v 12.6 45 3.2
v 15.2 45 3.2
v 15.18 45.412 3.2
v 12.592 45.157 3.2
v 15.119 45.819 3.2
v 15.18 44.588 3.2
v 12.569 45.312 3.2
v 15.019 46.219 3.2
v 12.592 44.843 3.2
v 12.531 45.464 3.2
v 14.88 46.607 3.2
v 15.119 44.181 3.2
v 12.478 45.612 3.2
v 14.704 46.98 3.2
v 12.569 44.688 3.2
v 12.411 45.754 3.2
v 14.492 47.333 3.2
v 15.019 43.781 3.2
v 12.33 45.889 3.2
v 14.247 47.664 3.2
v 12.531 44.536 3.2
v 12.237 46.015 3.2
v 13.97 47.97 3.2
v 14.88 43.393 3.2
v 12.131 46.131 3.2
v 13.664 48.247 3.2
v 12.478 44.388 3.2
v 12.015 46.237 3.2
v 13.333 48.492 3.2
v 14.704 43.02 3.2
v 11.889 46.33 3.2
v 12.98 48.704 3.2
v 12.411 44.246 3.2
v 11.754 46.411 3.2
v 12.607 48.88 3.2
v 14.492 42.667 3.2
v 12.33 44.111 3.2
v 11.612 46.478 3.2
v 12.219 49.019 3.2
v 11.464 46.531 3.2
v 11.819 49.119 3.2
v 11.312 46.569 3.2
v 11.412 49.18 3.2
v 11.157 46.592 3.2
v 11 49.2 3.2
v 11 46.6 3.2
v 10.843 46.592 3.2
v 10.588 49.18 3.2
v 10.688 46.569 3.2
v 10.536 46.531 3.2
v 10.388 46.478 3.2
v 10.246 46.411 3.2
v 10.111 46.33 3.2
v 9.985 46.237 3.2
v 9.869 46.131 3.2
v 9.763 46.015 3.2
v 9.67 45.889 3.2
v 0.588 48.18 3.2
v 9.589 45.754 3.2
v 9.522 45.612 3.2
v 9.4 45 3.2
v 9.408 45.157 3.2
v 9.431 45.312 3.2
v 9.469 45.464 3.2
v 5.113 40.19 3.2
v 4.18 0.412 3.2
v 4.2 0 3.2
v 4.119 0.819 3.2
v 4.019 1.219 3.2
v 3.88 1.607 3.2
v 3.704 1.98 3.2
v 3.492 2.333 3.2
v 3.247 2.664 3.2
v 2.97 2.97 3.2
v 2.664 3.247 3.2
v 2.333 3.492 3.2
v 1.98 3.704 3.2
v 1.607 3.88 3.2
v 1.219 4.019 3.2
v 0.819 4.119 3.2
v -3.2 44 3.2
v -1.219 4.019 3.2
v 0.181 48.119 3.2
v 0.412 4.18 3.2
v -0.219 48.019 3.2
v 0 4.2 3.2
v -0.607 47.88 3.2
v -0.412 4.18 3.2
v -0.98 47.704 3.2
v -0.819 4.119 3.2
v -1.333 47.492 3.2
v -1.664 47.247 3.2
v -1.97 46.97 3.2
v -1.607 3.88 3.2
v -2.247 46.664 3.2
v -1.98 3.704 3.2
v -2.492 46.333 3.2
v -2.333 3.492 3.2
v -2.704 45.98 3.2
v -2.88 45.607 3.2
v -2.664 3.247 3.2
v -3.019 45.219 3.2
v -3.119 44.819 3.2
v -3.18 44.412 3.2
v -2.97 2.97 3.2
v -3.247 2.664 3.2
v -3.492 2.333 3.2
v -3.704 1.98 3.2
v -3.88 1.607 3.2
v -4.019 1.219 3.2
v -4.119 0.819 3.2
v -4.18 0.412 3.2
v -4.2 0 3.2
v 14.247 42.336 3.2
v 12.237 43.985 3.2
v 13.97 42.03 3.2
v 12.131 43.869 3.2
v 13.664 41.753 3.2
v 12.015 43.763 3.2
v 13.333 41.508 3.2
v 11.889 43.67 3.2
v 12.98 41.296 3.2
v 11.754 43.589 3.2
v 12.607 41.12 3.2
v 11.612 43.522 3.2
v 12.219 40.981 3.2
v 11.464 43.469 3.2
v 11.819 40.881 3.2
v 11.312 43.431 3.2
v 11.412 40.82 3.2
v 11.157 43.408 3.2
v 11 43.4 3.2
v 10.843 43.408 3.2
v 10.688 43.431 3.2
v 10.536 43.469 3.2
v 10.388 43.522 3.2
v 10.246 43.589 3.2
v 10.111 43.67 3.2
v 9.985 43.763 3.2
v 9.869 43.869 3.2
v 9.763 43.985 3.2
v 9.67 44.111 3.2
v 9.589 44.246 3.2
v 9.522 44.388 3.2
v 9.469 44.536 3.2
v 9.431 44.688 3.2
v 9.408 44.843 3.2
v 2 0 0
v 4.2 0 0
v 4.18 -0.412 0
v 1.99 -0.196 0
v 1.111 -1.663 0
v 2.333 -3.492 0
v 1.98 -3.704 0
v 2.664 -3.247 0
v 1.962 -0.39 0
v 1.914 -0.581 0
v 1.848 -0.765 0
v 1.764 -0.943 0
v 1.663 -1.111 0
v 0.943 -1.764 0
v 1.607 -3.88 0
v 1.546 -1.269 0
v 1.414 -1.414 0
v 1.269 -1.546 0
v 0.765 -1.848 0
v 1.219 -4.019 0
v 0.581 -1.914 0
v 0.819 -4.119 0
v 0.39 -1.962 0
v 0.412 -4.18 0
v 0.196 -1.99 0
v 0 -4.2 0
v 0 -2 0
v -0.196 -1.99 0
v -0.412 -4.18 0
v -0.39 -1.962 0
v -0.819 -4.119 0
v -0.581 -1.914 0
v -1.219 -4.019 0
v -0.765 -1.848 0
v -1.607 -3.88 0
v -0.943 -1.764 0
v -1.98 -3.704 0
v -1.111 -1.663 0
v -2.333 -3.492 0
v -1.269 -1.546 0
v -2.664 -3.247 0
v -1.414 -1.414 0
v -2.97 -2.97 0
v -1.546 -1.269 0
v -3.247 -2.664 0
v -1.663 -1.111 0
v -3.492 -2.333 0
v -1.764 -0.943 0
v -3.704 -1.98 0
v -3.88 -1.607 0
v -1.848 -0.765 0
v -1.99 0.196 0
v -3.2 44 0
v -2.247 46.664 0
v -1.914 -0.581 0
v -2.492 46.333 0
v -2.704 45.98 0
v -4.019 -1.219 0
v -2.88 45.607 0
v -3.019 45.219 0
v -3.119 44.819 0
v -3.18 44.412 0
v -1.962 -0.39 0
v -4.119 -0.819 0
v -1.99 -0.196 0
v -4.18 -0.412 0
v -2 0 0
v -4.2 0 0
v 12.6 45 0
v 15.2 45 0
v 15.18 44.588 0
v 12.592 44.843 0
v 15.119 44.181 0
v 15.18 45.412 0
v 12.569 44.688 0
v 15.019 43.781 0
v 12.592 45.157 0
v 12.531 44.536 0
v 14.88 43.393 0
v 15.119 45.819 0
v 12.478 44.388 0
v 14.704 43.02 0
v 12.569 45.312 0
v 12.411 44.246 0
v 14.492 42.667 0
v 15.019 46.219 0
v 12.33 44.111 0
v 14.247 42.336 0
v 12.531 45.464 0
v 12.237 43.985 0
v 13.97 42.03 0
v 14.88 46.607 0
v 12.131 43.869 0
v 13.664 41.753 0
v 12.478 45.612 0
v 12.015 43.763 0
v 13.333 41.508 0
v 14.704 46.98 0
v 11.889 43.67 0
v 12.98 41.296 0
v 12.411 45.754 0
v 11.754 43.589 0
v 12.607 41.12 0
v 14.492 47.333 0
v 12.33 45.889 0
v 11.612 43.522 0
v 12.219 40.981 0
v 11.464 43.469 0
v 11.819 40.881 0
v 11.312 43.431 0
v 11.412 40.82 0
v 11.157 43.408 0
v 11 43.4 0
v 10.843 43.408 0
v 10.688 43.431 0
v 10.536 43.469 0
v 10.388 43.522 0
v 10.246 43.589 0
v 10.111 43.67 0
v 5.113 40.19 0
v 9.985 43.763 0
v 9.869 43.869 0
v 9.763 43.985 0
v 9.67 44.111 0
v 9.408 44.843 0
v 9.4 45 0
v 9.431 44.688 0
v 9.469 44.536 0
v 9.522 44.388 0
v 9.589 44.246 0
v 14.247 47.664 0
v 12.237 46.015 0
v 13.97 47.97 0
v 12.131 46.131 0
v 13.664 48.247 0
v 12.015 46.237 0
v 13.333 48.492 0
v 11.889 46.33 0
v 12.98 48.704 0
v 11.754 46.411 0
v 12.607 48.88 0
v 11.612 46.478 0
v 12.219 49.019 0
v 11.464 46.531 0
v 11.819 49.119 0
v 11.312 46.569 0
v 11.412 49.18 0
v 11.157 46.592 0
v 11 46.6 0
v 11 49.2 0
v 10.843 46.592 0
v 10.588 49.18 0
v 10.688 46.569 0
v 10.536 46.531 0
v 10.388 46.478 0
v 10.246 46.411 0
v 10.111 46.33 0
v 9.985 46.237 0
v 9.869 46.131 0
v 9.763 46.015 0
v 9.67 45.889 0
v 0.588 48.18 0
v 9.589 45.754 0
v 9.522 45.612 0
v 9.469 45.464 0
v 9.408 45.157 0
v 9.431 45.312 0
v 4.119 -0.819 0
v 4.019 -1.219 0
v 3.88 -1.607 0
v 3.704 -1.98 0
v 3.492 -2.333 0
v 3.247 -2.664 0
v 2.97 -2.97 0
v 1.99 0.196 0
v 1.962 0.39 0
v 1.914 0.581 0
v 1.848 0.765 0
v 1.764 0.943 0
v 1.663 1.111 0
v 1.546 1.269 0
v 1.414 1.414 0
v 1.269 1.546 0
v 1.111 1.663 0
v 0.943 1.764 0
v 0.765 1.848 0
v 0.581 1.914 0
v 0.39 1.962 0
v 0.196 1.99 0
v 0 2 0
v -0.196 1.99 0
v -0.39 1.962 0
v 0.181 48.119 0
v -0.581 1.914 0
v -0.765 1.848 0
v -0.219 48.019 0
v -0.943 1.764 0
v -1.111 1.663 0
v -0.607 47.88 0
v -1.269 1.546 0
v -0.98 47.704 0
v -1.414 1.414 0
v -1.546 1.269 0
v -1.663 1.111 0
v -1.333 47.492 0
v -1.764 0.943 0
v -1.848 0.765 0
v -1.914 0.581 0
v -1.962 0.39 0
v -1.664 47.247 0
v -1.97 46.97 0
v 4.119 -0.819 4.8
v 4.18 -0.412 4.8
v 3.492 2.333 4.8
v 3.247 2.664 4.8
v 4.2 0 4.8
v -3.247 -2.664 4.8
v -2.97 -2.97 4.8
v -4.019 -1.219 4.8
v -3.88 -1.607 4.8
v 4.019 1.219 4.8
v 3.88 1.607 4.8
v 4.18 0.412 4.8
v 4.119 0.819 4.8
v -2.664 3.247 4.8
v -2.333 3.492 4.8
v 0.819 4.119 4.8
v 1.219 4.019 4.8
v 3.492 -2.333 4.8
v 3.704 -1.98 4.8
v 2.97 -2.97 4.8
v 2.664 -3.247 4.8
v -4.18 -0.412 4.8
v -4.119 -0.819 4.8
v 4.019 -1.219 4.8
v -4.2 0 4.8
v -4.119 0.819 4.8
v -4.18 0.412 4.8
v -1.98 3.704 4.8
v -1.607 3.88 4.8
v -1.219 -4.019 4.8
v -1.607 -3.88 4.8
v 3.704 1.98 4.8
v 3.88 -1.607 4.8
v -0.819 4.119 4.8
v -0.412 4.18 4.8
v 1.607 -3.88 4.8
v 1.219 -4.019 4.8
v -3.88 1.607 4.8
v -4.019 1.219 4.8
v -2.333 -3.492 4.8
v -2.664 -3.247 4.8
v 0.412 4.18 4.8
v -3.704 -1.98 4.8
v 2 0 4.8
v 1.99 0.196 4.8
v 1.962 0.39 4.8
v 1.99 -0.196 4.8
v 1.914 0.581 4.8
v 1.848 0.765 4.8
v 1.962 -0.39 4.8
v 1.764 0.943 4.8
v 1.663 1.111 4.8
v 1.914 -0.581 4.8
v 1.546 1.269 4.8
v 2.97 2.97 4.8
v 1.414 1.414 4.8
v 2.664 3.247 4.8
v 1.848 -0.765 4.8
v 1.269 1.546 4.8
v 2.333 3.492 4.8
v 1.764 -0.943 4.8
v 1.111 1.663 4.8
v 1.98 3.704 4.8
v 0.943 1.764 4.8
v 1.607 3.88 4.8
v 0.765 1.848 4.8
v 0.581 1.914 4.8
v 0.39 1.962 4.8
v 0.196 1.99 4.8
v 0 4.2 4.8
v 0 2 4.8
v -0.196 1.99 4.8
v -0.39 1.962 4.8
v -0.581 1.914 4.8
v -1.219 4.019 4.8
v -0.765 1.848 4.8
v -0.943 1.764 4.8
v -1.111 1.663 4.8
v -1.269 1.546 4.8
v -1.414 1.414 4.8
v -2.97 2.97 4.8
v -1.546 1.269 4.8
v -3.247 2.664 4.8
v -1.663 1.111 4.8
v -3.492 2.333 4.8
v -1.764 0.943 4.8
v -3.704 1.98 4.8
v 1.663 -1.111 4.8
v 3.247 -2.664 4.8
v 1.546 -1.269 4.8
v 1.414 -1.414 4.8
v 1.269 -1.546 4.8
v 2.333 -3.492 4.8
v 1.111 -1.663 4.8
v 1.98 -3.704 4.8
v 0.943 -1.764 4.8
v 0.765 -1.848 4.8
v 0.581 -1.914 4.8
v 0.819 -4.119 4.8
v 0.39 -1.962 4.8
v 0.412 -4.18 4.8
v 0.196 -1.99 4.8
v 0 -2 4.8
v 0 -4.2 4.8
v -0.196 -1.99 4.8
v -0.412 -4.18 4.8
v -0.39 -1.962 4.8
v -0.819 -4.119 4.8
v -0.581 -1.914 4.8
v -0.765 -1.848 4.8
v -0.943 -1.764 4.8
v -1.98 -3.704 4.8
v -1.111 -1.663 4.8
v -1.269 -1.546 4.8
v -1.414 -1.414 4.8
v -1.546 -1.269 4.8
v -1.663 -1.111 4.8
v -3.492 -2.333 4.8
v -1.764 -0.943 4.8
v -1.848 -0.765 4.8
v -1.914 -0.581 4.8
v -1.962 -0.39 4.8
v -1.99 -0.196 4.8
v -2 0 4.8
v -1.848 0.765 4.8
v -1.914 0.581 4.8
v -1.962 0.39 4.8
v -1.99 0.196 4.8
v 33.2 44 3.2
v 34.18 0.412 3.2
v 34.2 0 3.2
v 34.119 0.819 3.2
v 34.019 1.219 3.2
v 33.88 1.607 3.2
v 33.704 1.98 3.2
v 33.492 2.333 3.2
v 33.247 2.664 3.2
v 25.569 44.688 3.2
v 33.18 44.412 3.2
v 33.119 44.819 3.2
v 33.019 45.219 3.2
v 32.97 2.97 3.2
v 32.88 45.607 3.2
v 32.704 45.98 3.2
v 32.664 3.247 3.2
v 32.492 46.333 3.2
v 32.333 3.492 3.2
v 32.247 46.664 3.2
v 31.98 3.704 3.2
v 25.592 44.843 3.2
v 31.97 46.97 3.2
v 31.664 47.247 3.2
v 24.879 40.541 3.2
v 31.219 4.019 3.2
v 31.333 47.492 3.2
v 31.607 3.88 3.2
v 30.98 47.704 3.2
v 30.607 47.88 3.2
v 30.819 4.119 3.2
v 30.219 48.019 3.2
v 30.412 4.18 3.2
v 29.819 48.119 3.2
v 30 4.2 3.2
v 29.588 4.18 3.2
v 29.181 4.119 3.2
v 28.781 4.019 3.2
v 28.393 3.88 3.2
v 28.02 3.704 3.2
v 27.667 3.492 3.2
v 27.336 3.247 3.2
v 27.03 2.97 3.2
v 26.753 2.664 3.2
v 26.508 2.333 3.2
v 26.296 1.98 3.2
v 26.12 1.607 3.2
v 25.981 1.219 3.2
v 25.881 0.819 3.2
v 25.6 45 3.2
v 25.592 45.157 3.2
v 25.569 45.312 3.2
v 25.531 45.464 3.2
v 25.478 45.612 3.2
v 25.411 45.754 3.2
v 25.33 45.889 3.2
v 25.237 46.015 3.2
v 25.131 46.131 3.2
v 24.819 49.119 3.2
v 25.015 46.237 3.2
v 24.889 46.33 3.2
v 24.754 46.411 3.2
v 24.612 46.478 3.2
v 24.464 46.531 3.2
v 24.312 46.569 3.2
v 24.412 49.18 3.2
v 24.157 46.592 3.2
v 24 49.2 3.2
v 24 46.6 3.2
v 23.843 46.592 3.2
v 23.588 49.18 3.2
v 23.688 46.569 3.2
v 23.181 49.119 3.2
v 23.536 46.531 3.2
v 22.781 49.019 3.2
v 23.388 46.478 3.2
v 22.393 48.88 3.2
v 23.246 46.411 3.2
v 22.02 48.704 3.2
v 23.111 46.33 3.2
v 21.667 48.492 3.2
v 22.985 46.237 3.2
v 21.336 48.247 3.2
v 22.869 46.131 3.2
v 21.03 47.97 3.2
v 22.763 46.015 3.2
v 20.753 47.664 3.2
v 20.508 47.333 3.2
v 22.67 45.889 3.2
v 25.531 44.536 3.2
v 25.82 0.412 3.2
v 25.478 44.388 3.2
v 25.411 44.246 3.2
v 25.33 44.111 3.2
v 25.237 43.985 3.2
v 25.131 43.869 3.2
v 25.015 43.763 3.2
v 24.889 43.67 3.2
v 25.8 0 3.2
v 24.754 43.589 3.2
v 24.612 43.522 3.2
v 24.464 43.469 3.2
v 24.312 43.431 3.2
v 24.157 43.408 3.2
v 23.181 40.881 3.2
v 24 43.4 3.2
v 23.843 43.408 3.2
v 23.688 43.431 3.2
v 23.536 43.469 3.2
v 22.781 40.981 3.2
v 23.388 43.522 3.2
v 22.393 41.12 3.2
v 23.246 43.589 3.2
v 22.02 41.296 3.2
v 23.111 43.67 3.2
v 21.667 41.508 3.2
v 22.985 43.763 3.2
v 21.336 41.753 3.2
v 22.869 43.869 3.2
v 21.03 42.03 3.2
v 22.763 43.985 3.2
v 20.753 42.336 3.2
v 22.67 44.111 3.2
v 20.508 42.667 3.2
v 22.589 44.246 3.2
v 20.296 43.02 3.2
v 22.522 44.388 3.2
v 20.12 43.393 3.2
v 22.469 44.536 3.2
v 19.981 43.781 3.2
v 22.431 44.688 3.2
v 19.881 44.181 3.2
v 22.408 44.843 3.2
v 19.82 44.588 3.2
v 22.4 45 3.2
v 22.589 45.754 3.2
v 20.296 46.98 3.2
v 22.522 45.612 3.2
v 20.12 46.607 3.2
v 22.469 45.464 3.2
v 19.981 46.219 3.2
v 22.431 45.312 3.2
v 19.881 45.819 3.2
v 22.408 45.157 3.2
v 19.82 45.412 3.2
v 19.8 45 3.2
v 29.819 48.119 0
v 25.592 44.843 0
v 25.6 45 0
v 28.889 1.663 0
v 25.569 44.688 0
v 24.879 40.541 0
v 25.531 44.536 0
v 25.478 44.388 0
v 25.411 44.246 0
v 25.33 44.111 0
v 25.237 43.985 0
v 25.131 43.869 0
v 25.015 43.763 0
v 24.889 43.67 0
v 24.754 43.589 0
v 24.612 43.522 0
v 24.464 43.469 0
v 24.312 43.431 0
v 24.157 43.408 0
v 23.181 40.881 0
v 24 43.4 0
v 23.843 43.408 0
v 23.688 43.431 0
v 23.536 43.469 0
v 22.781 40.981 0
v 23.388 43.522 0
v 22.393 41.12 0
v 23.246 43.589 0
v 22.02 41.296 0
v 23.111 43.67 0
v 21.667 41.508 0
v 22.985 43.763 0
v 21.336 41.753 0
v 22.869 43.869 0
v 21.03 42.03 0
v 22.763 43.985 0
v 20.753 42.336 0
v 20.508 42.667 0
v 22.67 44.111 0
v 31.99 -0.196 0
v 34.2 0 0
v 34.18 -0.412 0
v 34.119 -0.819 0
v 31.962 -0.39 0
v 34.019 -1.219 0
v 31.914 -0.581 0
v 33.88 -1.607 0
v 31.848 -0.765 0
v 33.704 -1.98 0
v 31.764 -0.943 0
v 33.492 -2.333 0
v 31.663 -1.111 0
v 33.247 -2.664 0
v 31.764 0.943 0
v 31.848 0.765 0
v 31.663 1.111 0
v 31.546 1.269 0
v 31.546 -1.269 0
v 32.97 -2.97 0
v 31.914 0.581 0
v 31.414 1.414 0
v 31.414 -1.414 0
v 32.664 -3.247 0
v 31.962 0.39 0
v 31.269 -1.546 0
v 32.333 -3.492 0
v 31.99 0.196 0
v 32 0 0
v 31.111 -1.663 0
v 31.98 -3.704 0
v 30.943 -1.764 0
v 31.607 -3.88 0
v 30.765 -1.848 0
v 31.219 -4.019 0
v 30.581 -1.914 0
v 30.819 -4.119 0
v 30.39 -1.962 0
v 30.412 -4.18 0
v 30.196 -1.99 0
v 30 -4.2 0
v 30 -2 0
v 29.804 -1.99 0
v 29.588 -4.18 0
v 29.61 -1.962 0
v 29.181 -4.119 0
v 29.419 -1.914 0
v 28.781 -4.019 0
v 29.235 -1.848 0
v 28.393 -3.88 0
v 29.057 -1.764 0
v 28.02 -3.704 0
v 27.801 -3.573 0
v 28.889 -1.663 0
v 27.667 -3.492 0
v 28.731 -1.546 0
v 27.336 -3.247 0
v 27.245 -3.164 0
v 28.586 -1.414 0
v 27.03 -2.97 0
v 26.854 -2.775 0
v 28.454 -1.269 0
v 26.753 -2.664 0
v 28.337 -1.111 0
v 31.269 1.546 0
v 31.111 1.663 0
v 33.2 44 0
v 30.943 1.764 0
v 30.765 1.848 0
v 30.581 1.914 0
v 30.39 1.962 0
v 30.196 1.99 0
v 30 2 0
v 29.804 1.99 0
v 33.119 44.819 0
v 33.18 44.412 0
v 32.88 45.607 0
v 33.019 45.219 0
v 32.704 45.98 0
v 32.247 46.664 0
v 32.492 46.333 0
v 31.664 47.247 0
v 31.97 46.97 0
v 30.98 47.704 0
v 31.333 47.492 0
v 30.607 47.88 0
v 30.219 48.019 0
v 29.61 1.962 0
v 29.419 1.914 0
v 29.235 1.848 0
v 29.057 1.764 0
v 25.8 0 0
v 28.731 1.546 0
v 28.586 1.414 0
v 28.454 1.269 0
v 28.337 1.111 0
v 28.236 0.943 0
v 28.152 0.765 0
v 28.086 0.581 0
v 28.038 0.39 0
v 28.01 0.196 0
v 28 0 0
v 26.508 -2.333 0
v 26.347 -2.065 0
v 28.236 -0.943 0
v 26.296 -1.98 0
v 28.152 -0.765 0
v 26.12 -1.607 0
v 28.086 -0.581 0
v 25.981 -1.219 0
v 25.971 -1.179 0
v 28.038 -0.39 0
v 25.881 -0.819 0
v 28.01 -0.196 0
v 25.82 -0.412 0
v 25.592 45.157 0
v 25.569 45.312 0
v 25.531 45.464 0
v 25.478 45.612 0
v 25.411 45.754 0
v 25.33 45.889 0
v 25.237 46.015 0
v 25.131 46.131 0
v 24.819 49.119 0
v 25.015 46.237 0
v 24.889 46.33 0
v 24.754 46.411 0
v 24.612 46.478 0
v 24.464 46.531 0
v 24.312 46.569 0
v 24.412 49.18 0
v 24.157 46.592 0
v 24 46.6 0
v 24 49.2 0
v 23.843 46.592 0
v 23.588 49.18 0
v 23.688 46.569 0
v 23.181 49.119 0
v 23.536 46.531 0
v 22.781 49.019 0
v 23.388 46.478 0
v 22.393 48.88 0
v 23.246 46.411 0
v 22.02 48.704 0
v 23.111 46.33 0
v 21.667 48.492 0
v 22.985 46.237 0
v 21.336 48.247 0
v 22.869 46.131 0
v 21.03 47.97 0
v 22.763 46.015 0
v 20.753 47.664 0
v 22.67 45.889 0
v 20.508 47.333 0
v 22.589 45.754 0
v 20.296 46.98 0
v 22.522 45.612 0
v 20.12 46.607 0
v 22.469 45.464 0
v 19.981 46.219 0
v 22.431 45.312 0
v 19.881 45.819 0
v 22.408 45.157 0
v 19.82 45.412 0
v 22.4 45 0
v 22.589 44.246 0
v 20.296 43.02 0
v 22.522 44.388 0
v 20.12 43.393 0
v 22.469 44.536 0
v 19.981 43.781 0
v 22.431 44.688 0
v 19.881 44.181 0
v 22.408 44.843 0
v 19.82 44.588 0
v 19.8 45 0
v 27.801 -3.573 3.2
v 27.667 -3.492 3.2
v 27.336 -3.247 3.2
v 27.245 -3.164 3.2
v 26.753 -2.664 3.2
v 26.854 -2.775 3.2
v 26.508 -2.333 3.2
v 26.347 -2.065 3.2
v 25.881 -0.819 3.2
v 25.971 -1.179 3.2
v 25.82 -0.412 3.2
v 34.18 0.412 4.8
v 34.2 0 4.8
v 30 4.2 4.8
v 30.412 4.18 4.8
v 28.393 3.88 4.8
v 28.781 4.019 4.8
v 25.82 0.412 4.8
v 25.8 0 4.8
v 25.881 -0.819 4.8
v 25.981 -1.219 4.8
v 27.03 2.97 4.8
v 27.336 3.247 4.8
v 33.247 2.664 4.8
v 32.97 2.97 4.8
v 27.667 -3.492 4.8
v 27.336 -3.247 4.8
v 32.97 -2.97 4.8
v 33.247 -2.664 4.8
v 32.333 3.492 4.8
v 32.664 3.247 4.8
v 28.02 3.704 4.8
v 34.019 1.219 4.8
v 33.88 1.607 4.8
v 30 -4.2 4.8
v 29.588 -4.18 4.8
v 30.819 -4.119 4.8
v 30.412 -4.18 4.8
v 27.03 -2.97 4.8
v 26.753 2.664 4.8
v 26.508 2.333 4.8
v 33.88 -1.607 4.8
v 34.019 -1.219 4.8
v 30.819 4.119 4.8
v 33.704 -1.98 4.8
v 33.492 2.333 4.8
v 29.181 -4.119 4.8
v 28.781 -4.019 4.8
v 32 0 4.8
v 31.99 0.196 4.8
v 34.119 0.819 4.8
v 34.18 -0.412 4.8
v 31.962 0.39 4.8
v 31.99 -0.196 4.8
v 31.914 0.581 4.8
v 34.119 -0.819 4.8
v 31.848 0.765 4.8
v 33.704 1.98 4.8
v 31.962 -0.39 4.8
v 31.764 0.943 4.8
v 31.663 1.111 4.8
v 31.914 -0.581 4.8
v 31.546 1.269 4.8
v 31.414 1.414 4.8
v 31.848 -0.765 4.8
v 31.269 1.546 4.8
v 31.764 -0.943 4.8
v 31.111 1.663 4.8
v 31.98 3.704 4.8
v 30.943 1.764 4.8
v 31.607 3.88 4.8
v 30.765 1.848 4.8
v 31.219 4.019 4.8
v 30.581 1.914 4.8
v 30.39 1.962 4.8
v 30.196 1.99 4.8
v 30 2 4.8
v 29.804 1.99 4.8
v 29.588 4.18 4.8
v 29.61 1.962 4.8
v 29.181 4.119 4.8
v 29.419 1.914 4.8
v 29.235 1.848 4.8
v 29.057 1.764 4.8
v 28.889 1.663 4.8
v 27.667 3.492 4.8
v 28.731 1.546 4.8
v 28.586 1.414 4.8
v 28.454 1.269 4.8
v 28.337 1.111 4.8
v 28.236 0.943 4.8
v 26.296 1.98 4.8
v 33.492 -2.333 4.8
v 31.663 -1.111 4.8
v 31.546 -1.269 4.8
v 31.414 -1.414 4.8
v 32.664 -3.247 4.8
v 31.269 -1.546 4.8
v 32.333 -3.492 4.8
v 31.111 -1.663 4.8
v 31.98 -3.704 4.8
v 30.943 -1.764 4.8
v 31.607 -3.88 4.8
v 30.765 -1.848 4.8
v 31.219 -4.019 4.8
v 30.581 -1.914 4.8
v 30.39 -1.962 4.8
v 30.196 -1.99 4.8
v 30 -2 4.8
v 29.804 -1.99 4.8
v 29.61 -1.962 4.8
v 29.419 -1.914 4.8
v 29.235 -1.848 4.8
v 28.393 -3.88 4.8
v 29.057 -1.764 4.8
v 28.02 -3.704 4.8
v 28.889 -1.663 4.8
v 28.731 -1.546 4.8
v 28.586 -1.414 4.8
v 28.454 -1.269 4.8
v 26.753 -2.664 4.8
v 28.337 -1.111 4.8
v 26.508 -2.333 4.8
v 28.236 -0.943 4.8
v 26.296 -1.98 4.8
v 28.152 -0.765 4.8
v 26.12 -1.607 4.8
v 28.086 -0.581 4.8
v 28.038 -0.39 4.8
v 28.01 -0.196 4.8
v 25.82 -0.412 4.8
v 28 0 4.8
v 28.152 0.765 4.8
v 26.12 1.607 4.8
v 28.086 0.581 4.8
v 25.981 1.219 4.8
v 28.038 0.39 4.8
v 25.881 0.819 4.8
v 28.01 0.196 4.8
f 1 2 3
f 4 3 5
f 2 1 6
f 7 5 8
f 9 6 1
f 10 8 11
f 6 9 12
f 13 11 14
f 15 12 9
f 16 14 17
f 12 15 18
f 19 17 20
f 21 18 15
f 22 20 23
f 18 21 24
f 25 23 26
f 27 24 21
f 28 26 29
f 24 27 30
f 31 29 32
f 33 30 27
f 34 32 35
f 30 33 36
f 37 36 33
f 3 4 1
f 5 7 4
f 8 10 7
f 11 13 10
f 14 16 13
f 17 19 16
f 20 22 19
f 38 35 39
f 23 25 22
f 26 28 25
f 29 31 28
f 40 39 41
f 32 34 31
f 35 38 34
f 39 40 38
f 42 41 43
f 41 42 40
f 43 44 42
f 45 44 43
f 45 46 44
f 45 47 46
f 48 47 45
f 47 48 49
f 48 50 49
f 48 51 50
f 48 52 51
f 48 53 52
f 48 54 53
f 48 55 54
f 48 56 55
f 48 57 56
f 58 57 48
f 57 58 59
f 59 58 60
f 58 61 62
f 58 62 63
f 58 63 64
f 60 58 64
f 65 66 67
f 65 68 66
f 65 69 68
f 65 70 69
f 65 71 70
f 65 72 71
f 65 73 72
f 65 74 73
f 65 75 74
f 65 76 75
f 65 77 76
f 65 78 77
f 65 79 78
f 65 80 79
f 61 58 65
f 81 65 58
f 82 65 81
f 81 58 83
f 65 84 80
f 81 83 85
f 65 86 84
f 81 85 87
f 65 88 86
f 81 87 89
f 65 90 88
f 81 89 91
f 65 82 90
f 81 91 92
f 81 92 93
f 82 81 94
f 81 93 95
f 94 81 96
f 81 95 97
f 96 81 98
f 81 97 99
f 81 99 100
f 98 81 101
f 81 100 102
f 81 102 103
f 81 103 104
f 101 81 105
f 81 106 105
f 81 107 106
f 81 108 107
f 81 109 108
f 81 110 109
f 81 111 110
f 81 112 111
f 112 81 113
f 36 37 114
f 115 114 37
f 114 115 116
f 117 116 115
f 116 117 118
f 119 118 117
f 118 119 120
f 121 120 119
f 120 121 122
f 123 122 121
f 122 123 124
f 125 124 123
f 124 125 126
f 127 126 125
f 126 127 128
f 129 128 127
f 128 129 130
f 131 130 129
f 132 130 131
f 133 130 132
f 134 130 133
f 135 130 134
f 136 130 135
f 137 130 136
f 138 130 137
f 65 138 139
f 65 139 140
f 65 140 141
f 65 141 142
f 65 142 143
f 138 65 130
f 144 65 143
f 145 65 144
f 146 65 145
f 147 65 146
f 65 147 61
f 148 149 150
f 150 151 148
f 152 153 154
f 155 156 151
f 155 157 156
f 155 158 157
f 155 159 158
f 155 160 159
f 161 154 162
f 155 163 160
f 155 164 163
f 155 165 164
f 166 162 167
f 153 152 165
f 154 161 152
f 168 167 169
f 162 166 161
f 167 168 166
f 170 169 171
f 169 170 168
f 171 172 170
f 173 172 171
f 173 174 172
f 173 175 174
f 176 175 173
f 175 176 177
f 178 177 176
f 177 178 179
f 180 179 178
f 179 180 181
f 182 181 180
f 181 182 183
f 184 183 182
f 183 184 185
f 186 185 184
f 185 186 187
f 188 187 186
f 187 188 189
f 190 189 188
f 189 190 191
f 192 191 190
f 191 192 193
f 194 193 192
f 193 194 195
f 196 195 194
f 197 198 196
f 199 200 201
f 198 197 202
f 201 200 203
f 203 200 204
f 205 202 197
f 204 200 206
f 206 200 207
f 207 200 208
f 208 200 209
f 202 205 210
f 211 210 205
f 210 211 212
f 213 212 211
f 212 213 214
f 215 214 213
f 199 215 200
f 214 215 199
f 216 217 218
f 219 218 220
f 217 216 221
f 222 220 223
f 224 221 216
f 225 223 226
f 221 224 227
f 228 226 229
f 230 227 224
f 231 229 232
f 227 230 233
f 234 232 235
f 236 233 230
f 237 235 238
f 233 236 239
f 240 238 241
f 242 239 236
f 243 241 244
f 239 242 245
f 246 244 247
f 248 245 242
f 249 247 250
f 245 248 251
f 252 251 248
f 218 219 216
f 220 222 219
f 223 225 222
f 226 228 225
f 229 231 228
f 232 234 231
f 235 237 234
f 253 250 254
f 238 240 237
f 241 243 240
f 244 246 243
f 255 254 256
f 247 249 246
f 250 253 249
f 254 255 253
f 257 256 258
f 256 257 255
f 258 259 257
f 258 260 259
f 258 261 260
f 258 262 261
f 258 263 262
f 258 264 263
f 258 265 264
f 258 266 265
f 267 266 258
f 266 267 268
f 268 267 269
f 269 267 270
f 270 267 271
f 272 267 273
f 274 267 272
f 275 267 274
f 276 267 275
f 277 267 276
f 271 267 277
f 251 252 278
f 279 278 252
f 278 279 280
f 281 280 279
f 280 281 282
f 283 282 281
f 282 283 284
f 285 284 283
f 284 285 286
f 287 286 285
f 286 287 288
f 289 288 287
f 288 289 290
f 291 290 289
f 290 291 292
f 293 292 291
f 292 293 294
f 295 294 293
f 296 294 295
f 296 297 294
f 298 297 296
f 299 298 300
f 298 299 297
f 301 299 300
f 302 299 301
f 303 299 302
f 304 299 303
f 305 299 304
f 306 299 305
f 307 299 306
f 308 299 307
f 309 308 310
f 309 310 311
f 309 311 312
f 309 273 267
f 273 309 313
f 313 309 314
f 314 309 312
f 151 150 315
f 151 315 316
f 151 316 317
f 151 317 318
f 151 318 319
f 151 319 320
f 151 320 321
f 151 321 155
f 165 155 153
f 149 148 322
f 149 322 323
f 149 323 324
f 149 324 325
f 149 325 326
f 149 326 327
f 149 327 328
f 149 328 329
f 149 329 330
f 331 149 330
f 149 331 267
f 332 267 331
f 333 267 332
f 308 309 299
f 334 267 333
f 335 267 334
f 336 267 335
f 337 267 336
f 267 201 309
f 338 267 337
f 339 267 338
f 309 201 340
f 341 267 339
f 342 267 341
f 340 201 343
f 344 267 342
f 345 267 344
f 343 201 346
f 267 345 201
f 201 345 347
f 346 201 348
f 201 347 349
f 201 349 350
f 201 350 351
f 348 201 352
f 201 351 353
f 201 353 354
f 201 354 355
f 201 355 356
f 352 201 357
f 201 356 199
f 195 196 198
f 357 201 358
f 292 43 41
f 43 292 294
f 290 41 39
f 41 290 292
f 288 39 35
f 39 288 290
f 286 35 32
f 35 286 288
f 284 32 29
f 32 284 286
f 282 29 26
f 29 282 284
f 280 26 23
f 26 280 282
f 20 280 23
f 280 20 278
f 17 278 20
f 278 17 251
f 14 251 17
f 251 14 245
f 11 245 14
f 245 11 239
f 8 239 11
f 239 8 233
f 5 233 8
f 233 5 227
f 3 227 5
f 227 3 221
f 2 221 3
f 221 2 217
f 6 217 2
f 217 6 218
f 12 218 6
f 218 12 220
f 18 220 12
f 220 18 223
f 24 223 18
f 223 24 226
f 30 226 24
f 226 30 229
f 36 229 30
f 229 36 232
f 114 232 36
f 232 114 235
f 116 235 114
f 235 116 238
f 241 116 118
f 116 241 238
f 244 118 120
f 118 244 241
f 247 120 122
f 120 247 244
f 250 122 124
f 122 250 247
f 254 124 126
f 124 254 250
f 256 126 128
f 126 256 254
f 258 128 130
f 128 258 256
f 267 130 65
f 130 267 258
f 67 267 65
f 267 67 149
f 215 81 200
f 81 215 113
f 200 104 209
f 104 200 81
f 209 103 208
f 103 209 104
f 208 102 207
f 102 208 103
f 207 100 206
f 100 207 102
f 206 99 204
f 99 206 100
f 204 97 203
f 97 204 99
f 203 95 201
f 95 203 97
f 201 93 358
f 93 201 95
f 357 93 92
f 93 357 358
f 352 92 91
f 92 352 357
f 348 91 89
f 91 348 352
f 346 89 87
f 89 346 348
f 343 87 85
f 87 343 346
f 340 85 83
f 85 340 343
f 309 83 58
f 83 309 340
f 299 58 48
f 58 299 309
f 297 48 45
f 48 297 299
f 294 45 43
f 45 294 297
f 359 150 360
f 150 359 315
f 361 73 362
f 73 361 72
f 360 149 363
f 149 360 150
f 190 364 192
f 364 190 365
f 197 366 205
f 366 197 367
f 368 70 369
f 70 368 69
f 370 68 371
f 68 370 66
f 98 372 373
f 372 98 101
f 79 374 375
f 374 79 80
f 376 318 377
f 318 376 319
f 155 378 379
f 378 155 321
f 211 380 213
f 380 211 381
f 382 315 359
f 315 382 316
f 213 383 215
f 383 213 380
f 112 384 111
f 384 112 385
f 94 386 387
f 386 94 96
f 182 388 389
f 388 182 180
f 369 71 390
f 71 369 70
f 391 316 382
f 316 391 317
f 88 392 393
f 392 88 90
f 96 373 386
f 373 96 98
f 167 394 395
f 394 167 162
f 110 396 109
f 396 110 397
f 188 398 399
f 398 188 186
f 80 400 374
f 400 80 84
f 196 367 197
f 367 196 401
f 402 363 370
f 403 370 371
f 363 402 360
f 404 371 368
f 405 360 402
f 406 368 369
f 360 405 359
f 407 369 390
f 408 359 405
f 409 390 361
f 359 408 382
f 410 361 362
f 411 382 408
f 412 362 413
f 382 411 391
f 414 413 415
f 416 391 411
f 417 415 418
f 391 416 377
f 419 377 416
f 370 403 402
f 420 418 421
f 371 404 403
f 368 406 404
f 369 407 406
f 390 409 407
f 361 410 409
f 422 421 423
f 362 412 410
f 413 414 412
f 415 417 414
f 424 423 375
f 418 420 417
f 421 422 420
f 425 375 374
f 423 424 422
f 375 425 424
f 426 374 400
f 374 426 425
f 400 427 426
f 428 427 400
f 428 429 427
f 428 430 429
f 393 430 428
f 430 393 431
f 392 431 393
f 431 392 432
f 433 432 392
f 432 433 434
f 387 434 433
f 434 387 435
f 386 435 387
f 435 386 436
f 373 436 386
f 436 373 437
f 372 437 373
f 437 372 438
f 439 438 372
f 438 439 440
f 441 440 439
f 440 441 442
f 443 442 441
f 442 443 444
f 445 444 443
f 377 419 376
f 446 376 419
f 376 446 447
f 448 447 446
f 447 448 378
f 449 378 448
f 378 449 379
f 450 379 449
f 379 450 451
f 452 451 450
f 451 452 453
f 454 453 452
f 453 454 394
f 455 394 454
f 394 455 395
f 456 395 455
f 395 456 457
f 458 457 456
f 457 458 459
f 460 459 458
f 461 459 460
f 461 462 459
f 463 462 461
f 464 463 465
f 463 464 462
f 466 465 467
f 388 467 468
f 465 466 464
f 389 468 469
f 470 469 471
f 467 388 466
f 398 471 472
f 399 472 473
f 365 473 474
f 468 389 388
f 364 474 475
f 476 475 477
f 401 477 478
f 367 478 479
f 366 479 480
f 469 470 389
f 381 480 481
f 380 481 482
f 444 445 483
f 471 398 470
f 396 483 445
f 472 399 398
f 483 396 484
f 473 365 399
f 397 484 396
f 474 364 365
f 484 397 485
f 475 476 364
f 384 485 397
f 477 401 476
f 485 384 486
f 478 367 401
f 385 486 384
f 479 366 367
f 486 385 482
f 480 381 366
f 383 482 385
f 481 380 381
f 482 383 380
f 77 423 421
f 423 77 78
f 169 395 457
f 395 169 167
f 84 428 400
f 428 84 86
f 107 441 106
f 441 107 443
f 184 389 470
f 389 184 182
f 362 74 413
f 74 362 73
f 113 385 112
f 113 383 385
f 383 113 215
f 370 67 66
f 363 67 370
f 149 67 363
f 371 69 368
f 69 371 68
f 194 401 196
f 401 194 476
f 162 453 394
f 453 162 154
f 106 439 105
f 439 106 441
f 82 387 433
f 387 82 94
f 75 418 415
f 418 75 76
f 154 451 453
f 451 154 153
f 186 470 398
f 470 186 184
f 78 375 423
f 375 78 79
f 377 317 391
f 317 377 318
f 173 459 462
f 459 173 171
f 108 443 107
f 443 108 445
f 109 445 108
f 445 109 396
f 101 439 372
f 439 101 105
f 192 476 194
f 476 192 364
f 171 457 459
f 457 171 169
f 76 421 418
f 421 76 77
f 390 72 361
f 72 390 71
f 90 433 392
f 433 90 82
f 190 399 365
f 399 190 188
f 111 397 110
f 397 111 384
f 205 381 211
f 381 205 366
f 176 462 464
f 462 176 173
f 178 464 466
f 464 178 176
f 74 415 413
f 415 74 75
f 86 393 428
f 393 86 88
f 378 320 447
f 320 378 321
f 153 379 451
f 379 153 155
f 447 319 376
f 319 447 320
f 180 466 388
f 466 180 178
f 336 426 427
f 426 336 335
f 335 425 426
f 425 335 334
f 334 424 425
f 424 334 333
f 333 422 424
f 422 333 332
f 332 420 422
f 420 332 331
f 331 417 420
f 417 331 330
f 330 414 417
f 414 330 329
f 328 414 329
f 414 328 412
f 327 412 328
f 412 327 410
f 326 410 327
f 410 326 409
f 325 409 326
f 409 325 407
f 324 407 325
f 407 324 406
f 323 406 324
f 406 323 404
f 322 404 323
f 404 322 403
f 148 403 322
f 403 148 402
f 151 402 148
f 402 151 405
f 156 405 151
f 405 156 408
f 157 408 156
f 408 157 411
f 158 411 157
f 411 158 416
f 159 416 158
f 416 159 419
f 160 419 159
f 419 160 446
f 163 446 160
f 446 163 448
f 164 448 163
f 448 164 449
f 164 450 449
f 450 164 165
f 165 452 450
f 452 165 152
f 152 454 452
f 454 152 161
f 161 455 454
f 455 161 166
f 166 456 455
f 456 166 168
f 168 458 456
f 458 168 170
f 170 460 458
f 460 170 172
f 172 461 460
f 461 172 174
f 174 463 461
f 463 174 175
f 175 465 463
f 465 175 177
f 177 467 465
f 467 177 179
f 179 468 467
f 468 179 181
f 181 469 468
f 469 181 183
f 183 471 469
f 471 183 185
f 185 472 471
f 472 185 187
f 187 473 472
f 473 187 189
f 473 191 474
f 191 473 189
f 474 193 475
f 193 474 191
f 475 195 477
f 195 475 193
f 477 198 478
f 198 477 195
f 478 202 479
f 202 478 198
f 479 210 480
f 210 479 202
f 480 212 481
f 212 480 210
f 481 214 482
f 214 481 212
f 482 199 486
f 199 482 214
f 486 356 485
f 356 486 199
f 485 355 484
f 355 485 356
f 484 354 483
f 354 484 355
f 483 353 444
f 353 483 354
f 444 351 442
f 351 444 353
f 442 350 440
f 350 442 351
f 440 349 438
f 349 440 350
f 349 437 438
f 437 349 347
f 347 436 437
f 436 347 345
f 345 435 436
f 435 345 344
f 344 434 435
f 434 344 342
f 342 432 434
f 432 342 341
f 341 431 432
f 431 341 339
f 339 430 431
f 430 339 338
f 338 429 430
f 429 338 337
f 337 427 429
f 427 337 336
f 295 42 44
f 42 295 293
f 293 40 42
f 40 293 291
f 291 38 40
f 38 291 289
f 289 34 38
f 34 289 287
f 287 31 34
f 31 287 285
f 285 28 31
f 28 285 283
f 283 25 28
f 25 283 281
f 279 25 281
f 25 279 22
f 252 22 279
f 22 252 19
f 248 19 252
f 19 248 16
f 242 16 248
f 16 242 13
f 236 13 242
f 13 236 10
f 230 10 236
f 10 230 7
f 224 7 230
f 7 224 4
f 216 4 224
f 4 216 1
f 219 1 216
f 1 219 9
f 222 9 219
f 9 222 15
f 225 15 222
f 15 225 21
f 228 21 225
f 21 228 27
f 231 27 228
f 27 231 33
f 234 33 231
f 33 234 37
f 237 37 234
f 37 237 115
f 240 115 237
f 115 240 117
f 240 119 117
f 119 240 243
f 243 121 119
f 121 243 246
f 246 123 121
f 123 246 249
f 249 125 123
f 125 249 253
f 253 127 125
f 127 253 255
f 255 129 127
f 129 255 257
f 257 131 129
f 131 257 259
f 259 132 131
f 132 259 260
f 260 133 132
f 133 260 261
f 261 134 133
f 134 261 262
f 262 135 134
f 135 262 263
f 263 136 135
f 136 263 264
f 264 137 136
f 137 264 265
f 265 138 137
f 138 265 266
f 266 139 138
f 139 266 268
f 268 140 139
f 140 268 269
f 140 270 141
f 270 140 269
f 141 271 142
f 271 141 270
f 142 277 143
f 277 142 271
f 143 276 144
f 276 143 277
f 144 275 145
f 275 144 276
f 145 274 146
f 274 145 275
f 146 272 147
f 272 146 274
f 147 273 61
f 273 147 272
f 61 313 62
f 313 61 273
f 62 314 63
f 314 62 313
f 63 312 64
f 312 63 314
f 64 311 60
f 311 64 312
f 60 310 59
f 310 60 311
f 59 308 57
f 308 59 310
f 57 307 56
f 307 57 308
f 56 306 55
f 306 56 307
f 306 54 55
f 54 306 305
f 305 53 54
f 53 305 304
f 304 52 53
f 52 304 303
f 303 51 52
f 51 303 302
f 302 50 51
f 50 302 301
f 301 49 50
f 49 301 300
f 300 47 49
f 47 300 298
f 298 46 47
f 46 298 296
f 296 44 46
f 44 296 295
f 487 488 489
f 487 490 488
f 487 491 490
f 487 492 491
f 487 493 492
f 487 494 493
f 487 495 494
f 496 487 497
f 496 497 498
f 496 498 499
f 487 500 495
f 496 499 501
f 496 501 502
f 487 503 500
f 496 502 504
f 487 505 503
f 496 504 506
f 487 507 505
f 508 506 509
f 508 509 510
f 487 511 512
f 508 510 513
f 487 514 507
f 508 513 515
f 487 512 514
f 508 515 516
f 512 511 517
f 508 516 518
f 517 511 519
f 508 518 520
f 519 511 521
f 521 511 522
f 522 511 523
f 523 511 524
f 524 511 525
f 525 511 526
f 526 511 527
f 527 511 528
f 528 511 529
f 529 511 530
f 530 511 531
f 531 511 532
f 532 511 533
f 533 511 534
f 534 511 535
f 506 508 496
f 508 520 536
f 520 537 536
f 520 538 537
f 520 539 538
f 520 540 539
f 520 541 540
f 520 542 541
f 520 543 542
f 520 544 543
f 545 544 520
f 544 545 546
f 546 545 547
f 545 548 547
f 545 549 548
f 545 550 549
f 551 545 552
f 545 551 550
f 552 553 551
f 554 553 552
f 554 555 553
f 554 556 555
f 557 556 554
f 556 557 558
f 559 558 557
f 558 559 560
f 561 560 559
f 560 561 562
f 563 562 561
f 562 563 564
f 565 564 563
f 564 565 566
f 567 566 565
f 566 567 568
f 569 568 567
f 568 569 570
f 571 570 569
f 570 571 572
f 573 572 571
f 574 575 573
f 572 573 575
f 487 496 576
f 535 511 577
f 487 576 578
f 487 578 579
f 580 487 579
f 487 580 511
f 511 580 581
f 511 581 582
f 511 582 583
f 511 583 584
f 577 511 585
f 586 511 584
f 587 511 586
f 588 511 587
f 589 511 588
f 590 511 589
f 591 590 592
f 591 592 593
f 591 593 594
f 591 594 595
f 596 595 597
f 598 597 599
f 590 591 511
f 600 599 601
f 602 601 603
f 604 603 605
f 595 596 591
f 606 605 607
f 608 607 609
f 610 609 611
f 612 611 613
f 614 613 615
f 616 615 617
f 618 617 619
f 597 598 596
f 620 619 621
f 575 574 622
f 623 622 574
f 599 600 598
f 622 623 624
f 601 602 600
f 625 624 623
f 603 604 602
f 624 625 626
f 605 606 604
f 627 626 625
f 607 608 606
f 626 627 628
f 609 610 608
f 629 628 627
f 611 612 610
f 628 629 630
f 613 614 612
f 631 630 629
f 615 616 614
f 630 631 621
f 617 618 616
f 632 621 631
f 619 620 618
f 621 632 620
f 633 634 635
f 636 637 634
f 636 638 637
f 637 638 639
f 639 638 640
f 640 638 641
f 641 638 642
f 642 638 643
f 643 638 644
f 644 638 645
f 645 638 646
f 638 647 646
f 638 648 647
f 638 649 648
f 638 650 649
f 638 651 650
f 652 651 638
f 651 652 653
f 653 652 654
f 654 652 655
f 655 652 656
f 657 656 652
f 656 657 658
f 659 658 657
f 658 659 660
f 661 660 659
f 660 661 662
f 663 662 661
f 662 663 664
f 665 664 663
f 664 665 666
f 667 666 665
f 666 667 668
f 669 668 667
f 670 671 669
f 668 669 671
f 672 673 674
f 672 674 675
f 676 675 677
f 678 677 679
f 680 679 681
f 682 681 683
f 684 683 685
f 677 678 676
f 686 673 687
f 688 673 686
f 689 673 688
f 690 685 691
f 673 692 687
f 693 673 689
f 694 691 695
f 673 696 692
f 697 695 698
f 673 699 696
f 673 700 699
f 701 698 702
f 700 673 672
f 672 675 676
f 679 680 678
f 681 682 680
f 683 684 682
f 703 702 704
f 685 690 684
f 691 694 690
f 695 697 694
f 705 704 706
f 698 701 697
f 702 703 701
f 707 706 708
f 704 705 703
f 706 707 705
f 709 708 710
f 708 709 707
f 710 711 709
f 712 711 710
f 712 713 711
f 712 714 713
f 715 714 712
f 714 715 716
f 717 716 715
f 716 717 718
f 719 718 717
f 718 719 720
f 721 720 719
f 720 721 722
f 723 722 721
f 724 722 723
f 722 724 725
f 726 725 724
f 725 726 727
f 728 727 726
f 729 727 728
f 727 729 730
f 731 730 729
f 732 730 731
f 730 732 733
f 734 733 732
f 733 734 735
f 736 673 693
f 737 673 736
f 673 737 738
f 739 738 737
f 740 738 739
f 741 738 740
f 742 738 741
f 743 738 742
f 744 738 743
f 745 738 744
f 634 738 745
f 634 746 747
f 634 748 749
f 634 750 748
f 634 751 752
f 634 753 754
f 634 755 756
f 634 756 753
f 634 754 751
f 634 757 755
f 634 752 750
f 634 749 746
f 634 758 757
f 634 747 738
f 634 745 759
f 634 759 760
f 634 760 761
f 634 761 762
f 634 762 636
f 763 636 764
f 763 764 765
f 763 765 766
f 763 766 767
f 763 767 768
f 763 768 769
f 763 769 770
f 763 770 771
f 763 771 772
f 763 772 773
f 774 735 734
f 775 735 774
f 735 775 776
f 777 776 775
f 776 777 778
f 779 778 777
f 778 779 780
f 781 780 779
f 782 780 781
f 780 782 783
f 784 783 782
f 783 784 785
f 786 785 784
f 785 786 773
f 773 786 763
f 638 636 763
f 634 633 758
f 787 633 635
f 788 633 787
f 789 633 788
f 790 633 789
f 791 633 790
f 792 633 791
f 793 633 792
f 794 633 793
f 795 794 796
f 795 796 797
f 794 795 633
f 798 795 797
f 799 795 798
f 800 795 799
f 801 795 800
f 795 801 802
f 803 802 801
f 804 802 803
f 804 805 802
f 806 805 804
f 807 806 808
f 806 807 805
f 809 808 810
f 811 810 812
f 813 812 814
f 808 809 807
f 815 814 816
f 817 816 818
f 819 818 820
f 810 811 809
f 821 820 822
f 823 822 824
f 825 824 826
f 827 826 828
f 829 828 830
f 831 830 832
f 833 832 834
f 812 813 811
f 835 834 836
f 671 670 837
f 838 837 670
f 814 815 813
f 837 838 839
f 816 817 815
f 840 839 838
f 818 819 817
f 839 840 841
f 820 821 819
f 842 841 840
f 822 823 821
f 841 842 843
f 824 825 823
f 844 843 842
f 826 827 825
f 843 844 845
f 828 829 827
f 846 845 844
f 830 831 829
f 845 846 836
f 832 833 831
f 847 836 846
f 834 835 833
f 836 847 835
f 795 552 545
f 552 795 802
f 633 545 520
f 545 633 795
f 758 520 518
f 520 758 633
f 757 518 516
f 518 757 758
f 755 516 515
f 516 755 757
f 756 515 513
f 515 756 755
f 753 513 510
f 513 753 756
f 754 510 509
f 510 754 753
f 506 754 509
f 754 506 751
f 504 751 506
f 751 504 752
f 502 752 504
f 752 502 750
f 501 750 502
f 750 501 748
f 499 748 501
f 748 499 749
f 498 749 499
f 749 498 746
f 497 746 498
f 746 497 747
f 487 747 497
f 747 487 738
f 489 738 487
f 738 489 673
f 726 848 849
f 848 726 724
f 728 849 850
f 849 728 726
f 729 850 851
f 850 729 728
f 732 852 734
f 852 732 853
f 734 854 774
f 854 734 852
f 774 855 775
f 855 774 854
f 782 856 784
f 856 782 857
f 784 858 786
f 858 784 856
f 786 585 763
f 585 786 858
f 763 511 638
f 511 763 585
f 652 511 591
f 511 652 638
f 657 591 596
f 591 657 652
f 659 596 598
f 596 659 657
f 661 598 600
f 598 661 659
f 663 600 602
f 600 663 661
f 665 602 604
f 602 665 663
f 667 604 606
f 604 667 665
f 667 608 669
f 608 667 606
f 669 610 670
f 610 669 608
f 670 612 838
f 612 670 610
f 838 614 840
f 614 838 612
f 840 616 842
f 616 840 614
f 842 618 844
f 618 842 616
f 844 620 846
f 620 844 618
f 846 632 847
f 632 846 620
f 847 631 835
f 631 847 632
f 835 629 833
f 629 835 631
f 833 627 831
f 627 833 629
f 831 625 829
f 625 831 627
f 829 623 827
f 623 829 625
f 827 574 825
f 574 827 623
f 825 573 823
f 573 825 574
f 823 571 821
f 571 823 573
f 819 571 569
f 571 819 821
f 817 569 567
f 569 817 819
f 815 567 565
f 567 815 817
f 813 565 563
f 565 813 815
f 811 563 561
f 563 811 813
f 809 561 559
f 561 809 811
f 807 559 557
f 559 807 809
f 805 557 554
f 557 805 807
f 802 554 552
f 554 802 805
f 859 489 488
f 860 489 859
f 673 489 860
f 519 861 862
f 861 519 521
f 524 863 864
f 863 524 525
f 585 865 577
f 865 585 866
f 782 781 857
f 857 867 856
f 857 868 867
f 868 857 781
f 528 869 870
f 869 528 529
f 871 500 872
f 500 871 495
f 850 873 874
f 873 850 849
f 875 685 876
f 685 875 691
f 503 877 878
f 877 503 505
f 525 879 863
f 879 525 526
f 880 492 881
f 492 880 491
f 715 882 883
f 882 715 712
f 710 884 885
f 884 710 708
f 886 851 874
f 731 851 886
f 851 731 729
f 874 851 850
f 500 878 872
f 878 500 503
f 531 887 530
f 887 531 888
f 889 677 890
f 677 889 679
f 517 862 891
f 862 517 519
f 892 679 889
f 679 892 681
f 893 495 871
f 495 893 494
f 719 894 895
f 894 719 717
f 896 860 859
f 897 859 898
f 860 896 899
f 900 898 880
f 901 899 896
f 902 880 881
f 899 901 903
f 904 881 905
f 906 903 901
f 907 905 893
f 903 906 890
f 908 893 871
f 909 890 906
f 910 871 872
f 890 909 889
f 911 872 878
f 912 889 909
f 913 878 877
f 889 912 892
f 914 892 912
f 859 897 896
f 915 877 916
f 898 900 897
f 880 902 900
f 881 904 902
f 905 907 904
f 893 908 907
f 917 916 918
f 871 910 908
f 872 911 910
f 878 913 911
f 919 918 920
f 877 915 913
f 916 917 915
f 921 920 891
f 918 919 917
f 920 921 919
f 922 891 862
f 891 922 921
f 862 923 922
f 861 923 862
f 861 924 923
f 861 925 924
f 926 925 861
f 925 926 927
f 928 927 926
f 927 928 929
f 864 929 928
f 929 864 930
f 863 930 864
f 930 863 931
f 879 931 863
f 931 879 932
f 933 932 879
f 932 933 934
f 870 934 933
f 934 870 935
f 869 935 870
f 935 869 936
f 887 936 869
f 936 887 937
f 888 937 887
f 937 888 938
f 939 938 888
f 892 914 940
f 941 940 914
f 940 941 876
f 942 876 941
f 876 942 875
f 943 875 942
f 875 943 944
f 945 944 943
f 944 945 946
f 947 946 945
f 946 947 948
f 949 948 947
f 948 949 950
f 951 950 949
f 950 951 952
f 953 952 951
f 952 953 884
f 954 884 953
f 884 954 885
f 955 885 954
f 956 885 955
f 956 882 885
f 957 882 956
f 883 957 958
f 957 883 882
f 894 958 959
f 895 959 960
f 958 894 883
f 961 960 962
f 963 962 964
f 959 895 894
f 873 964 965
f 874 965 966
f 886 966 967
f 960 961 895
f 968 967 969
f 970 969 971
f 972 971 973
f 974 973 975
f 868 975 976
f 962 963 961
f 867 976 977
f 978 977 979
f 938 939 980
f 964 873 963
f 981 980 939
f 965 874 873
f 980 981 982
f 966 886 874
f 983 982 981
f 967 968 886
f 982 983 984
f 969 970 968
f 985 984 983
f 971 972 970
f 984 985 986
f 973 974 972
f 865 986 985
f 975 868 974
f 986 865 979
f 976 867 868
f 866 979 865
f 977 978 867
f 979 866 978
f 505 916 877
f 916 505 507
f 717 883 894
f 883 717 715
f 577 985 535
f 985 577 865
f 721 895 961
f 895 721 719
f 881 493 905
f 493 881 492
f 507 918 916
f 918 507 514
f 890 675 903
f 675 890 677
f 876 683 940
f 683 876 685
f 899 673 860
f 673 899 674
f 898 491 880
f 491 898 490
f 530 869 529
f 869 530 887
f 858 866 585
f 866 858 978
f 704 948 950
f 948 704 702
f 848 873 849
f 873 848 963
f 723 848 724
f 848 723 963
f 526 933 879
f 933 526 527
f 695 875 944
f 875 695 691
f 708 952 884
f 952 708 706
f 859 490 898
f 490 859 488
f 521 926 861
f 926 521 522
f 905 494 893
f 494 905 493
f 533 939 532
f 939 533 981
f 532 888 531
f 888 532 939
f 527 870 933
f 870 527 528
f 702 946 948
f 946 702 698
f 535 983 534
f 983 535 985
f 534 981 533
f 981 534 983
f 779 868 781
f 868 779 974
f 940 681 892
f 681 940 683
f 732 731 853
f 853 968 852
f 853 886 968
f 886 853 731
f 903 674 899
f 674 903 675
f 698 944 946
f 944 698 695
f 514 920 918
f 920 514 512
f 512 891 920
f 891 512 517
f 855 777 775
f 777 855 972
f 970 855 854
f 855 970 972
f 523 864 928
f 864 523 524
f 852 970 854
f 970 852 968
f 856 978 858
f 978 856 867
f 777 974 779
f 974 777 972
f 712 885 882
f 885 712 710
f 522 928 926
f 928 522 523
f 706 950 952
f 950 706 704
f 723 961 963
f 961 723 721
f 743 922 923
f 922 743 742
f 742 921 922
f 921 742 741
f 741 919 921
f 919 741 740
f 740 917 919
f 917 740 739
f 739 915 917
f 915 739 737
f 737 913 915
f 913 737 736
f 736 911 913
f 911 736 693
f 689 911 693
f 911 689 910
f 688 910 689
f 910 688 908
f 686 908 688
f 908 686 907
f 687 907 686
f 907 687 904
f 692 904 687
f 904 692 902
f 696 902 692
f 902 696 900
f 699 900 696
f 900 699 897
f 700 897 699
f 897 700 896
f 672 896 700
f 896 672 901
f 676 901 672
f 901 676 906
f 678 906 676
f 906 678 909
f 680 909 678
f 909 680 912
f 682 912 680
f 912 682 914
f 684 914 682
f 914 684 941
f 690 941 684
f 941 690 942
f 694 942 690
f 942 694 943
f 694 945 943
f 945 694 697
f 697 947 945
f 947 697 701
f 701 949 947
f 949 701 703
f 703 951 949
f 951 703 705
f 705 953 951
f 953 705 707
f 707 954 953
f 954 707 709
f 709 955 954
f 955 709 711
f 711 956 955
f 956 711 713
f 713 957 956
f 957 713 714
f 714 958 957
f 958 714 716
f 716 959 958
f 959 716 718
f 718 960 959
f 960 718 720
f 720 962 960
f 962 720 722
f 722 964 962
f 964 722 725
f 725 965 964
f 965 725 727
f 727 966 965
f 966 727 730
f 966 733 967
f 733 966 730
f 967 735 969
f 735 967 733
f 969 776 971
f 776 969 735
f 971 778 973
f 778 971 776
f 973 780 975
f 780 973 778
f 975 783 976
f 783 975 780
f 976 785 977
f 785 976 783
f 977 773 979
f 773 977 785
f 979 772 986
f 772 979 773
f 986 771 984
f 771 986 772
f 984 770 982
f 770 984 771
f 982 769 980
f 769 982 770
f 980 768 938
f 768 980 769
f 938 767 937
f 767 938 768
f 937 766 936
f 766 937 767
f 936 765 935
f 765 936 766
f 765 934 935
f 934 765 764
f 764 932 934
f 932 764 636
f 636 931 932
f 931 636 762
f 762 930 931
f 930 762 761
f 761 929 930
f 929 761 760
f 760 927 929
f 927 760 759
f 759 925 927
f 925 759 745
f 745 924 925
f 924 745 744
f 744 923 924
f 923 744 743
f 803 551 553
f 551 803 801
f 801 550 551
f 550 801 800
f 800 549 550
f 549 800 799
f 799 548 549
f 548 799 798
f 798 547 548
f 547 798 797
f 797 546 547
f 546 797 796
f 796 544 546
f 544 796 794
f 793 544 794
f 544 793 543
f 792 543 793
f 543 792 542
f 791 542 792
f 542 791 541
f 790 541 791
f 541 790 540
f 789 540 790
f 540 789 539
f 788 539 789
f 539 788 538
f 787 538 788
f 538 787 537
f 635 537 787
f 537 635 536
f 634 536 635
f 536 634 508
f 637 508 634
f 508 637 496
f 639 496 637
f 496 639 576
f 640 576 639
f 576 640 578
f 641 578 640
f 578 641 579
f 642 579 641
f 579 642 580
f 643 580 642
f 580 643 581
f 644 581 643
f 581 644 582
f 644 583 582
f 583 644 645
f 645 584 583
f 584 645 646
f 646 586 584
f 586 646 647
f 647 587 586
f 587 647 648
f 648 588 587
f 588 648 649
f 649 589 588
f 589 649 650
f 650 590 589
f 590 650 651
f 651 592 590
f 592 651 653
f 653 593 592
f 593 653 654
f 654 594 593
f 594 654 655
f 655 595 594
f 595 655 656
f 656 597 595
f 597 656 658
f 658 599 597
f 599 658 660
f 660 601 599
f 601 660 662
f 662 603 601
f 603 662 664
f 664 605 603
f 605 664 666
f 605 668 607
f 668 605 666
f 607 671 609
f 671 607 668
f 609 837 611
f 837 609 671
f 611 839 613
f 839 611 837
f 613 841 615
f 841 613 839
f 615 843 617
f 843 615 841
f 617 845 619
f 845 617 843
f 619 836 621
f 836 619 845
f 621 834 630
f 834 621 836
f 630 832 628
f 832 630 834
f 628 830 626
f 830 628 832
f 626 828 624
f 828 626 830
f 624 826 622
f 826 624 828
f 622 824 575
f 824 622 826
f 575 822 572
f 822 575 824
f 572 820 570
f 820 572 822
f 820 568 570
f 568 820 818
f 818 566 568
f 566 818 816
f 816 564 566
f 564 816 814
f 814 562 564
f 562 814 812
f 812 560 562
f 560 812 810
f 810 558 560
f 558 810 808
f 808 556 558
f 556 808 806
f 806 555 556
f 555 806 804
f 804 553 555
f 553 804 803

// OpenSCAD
// Voice intercom V9 • two insulating lower supports, provisional dimensions (mm).
// Z in assembly: PCB front surface = 0, rear of shell = positive.
// Measure the lower post seat and screw/thread engagement before printing for fit.
part = "print"; // [print,assembly,left,right]
pcb_thickness = 1.6;
post_seat_z = 0;
rail_thickness = 3.2;
rail_width = 8.4;
pcb_screw_d = 3.2;
shell_screw_d = 4.0;
$fn = 64;

// Same front-view coordinates used by the 1:1 shell overlay.
left = [[11,64], [1,65], [0,109]];
right = [[103,64], [108,65], [109,109]];

module disk_at(pt, diameter) {
    translate(pt) circle(d=diameter);
}

module support(pts) {
    // Bracket body and post seat use a continuous spine; the lower end has a
    // step so that the top of the PCB can still sit at the upper screw datum.
    seat_top = post_seat_z;
    seat_end = pcb_thickness+rail_thickness;
    assert(post_seat_z <= pcb_thickness, "Measure the lower post and adjust the standoff stack");
    difference() {
        union() {
            translate([0,0,pcb_thickness]) linear_extrude(rail_thickness) {
                for (i=[0:len(pts)-2]) hull() {
                    disk_at(pts[i],rail_width);
                    disk_at(pts[i+1],rail_width);
                }
            }
            translate([0,0,seat_top]) linear_extrude(seat_end-seat_top)
                disk_at(pts[2],rail_width);
        }
        translate([0,0,seat_top-0.1]) linear_extrude(seat_end-seat_top+0.2) {
            disk_at(pts[0],pcb_screw_d);
            disk_at(pts[2],shell_screw_d);
        }
    }
}

// Turn the flat rear faces down onto the print bed and separate the pieces.
module flat(pts, offset) {
    translate([offset-pts[2][0],pts[2][1],pcb_thickness+rail_thickness])
        rotate([180,0,0]) support(pts);
}

if (part=="assembly") {
    support(left);
    support(right);
} else if (part=="left") {
    flat(left,0);
} else if (part=="right") {
    flat(right,0);
} else {
    flat(left,0);
    flat(right,30);
}
